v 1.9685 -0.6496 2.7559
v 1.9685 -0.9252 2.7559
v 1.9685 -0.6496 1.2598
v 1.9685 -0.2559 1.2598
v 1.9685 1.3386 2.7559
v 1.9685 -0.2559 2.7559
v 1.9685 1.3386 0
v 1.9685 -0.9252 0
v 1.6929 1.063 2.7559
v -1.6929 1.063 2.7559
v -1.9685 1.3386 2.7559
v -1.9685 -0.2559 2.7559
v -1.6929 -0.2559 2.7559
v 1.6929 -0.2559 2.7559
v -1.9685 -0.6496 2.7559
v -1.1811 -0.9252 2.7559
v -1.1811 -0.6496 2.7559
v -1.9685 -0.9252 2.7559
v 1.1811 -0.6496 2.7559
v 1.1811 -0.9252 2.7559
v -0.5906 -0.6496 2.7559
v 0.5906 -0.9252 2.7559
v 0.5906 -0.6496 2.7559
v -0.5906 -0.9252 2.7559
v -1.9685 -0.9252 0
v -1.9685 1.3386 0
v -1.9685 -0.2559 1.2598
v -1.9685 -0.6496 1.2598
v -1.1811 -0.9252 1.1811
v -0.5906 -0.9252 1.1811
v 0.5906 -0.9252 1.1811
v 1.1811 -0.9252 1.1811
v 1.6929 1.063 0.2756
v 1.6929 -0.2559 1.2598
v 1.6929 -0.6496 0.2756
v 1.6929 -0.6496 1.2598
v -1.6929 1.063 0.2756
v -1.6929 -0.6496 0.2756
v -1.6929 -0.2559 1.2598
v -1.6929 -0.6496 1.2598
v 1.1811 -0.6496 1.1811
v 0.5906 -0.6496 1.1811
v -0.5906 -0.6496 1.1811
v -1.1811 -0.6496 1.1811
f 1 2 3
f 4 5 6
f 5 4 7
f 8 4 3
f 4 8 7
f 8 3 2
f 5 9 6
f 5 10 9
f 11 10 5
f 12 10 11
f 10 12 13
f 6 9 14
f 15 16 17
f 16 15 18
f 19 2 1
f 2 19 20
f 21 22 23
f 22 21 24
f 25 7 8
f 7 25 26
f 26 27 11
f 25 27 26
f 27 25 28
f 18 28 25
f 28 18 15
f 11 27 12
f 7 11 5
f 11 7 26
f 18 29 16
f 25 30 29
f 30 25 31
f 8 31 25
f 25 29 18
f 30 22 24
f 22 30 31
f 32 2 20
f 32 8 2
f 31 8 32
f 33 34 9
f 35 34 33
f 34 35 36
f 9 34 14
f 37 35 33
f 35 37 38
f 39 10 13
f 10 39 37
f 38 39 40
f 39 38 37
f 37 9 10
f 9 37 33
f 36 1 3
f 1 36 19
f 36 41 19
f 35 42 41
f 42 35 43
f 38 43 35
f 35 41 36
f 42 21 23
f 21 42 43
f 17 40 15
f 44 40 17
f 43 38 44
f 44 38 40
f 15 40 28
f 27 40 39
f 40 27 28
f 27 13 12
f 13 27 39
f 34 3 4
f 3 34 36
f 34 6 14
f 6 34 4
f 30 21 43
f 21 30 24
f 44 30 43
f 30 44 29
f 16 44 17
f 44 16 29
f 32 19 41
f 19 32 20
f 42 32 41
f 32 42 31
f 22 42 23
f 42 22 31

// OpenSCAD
// file: defines.scad
// example012.stl is Mblock.stl, (c) 2009 Will Langford
// licensed under the Creative Commons - GNU GPL license.
// http://www.thingiverse.com/thing:753

//import("sim800c.stl", convexity=3);

// PCB

A = 2.5;
B = 10.0;

scale = 1/2.54;
// main file
include <defines.scad>

W = 5.75;
W_O = 2.35;
H = 7.0;

th = 0.7; // Walls

scale(scale) color("White") {

difference() {
// Base

  translate([-B/2, -W_O, 0])
    cube(size = [B, W, H], center = false);

  translate([-B/2 + th, -W_O + th, th])
    cube(size = [B - th*2, W - th*2, H], center = false);

    translate([-B/2-1 , -W_O + th, H-3.8])
      cube(size = [2, 1, 3.9], center = false);

    translate([ B/2-1 , -W_O + th, H-3.8])
      cube(size = [2, 1, 3.9], center = false);

    translate([ -3, -W_O - 1, H-4.0])
      cube(size = [1.5, 2, 4.1], center = false);

    translate([ 1.5, -W_O - 1, H-4.0])
      cube(size = [1.5, 2, 4.1], center = false);
}


}
